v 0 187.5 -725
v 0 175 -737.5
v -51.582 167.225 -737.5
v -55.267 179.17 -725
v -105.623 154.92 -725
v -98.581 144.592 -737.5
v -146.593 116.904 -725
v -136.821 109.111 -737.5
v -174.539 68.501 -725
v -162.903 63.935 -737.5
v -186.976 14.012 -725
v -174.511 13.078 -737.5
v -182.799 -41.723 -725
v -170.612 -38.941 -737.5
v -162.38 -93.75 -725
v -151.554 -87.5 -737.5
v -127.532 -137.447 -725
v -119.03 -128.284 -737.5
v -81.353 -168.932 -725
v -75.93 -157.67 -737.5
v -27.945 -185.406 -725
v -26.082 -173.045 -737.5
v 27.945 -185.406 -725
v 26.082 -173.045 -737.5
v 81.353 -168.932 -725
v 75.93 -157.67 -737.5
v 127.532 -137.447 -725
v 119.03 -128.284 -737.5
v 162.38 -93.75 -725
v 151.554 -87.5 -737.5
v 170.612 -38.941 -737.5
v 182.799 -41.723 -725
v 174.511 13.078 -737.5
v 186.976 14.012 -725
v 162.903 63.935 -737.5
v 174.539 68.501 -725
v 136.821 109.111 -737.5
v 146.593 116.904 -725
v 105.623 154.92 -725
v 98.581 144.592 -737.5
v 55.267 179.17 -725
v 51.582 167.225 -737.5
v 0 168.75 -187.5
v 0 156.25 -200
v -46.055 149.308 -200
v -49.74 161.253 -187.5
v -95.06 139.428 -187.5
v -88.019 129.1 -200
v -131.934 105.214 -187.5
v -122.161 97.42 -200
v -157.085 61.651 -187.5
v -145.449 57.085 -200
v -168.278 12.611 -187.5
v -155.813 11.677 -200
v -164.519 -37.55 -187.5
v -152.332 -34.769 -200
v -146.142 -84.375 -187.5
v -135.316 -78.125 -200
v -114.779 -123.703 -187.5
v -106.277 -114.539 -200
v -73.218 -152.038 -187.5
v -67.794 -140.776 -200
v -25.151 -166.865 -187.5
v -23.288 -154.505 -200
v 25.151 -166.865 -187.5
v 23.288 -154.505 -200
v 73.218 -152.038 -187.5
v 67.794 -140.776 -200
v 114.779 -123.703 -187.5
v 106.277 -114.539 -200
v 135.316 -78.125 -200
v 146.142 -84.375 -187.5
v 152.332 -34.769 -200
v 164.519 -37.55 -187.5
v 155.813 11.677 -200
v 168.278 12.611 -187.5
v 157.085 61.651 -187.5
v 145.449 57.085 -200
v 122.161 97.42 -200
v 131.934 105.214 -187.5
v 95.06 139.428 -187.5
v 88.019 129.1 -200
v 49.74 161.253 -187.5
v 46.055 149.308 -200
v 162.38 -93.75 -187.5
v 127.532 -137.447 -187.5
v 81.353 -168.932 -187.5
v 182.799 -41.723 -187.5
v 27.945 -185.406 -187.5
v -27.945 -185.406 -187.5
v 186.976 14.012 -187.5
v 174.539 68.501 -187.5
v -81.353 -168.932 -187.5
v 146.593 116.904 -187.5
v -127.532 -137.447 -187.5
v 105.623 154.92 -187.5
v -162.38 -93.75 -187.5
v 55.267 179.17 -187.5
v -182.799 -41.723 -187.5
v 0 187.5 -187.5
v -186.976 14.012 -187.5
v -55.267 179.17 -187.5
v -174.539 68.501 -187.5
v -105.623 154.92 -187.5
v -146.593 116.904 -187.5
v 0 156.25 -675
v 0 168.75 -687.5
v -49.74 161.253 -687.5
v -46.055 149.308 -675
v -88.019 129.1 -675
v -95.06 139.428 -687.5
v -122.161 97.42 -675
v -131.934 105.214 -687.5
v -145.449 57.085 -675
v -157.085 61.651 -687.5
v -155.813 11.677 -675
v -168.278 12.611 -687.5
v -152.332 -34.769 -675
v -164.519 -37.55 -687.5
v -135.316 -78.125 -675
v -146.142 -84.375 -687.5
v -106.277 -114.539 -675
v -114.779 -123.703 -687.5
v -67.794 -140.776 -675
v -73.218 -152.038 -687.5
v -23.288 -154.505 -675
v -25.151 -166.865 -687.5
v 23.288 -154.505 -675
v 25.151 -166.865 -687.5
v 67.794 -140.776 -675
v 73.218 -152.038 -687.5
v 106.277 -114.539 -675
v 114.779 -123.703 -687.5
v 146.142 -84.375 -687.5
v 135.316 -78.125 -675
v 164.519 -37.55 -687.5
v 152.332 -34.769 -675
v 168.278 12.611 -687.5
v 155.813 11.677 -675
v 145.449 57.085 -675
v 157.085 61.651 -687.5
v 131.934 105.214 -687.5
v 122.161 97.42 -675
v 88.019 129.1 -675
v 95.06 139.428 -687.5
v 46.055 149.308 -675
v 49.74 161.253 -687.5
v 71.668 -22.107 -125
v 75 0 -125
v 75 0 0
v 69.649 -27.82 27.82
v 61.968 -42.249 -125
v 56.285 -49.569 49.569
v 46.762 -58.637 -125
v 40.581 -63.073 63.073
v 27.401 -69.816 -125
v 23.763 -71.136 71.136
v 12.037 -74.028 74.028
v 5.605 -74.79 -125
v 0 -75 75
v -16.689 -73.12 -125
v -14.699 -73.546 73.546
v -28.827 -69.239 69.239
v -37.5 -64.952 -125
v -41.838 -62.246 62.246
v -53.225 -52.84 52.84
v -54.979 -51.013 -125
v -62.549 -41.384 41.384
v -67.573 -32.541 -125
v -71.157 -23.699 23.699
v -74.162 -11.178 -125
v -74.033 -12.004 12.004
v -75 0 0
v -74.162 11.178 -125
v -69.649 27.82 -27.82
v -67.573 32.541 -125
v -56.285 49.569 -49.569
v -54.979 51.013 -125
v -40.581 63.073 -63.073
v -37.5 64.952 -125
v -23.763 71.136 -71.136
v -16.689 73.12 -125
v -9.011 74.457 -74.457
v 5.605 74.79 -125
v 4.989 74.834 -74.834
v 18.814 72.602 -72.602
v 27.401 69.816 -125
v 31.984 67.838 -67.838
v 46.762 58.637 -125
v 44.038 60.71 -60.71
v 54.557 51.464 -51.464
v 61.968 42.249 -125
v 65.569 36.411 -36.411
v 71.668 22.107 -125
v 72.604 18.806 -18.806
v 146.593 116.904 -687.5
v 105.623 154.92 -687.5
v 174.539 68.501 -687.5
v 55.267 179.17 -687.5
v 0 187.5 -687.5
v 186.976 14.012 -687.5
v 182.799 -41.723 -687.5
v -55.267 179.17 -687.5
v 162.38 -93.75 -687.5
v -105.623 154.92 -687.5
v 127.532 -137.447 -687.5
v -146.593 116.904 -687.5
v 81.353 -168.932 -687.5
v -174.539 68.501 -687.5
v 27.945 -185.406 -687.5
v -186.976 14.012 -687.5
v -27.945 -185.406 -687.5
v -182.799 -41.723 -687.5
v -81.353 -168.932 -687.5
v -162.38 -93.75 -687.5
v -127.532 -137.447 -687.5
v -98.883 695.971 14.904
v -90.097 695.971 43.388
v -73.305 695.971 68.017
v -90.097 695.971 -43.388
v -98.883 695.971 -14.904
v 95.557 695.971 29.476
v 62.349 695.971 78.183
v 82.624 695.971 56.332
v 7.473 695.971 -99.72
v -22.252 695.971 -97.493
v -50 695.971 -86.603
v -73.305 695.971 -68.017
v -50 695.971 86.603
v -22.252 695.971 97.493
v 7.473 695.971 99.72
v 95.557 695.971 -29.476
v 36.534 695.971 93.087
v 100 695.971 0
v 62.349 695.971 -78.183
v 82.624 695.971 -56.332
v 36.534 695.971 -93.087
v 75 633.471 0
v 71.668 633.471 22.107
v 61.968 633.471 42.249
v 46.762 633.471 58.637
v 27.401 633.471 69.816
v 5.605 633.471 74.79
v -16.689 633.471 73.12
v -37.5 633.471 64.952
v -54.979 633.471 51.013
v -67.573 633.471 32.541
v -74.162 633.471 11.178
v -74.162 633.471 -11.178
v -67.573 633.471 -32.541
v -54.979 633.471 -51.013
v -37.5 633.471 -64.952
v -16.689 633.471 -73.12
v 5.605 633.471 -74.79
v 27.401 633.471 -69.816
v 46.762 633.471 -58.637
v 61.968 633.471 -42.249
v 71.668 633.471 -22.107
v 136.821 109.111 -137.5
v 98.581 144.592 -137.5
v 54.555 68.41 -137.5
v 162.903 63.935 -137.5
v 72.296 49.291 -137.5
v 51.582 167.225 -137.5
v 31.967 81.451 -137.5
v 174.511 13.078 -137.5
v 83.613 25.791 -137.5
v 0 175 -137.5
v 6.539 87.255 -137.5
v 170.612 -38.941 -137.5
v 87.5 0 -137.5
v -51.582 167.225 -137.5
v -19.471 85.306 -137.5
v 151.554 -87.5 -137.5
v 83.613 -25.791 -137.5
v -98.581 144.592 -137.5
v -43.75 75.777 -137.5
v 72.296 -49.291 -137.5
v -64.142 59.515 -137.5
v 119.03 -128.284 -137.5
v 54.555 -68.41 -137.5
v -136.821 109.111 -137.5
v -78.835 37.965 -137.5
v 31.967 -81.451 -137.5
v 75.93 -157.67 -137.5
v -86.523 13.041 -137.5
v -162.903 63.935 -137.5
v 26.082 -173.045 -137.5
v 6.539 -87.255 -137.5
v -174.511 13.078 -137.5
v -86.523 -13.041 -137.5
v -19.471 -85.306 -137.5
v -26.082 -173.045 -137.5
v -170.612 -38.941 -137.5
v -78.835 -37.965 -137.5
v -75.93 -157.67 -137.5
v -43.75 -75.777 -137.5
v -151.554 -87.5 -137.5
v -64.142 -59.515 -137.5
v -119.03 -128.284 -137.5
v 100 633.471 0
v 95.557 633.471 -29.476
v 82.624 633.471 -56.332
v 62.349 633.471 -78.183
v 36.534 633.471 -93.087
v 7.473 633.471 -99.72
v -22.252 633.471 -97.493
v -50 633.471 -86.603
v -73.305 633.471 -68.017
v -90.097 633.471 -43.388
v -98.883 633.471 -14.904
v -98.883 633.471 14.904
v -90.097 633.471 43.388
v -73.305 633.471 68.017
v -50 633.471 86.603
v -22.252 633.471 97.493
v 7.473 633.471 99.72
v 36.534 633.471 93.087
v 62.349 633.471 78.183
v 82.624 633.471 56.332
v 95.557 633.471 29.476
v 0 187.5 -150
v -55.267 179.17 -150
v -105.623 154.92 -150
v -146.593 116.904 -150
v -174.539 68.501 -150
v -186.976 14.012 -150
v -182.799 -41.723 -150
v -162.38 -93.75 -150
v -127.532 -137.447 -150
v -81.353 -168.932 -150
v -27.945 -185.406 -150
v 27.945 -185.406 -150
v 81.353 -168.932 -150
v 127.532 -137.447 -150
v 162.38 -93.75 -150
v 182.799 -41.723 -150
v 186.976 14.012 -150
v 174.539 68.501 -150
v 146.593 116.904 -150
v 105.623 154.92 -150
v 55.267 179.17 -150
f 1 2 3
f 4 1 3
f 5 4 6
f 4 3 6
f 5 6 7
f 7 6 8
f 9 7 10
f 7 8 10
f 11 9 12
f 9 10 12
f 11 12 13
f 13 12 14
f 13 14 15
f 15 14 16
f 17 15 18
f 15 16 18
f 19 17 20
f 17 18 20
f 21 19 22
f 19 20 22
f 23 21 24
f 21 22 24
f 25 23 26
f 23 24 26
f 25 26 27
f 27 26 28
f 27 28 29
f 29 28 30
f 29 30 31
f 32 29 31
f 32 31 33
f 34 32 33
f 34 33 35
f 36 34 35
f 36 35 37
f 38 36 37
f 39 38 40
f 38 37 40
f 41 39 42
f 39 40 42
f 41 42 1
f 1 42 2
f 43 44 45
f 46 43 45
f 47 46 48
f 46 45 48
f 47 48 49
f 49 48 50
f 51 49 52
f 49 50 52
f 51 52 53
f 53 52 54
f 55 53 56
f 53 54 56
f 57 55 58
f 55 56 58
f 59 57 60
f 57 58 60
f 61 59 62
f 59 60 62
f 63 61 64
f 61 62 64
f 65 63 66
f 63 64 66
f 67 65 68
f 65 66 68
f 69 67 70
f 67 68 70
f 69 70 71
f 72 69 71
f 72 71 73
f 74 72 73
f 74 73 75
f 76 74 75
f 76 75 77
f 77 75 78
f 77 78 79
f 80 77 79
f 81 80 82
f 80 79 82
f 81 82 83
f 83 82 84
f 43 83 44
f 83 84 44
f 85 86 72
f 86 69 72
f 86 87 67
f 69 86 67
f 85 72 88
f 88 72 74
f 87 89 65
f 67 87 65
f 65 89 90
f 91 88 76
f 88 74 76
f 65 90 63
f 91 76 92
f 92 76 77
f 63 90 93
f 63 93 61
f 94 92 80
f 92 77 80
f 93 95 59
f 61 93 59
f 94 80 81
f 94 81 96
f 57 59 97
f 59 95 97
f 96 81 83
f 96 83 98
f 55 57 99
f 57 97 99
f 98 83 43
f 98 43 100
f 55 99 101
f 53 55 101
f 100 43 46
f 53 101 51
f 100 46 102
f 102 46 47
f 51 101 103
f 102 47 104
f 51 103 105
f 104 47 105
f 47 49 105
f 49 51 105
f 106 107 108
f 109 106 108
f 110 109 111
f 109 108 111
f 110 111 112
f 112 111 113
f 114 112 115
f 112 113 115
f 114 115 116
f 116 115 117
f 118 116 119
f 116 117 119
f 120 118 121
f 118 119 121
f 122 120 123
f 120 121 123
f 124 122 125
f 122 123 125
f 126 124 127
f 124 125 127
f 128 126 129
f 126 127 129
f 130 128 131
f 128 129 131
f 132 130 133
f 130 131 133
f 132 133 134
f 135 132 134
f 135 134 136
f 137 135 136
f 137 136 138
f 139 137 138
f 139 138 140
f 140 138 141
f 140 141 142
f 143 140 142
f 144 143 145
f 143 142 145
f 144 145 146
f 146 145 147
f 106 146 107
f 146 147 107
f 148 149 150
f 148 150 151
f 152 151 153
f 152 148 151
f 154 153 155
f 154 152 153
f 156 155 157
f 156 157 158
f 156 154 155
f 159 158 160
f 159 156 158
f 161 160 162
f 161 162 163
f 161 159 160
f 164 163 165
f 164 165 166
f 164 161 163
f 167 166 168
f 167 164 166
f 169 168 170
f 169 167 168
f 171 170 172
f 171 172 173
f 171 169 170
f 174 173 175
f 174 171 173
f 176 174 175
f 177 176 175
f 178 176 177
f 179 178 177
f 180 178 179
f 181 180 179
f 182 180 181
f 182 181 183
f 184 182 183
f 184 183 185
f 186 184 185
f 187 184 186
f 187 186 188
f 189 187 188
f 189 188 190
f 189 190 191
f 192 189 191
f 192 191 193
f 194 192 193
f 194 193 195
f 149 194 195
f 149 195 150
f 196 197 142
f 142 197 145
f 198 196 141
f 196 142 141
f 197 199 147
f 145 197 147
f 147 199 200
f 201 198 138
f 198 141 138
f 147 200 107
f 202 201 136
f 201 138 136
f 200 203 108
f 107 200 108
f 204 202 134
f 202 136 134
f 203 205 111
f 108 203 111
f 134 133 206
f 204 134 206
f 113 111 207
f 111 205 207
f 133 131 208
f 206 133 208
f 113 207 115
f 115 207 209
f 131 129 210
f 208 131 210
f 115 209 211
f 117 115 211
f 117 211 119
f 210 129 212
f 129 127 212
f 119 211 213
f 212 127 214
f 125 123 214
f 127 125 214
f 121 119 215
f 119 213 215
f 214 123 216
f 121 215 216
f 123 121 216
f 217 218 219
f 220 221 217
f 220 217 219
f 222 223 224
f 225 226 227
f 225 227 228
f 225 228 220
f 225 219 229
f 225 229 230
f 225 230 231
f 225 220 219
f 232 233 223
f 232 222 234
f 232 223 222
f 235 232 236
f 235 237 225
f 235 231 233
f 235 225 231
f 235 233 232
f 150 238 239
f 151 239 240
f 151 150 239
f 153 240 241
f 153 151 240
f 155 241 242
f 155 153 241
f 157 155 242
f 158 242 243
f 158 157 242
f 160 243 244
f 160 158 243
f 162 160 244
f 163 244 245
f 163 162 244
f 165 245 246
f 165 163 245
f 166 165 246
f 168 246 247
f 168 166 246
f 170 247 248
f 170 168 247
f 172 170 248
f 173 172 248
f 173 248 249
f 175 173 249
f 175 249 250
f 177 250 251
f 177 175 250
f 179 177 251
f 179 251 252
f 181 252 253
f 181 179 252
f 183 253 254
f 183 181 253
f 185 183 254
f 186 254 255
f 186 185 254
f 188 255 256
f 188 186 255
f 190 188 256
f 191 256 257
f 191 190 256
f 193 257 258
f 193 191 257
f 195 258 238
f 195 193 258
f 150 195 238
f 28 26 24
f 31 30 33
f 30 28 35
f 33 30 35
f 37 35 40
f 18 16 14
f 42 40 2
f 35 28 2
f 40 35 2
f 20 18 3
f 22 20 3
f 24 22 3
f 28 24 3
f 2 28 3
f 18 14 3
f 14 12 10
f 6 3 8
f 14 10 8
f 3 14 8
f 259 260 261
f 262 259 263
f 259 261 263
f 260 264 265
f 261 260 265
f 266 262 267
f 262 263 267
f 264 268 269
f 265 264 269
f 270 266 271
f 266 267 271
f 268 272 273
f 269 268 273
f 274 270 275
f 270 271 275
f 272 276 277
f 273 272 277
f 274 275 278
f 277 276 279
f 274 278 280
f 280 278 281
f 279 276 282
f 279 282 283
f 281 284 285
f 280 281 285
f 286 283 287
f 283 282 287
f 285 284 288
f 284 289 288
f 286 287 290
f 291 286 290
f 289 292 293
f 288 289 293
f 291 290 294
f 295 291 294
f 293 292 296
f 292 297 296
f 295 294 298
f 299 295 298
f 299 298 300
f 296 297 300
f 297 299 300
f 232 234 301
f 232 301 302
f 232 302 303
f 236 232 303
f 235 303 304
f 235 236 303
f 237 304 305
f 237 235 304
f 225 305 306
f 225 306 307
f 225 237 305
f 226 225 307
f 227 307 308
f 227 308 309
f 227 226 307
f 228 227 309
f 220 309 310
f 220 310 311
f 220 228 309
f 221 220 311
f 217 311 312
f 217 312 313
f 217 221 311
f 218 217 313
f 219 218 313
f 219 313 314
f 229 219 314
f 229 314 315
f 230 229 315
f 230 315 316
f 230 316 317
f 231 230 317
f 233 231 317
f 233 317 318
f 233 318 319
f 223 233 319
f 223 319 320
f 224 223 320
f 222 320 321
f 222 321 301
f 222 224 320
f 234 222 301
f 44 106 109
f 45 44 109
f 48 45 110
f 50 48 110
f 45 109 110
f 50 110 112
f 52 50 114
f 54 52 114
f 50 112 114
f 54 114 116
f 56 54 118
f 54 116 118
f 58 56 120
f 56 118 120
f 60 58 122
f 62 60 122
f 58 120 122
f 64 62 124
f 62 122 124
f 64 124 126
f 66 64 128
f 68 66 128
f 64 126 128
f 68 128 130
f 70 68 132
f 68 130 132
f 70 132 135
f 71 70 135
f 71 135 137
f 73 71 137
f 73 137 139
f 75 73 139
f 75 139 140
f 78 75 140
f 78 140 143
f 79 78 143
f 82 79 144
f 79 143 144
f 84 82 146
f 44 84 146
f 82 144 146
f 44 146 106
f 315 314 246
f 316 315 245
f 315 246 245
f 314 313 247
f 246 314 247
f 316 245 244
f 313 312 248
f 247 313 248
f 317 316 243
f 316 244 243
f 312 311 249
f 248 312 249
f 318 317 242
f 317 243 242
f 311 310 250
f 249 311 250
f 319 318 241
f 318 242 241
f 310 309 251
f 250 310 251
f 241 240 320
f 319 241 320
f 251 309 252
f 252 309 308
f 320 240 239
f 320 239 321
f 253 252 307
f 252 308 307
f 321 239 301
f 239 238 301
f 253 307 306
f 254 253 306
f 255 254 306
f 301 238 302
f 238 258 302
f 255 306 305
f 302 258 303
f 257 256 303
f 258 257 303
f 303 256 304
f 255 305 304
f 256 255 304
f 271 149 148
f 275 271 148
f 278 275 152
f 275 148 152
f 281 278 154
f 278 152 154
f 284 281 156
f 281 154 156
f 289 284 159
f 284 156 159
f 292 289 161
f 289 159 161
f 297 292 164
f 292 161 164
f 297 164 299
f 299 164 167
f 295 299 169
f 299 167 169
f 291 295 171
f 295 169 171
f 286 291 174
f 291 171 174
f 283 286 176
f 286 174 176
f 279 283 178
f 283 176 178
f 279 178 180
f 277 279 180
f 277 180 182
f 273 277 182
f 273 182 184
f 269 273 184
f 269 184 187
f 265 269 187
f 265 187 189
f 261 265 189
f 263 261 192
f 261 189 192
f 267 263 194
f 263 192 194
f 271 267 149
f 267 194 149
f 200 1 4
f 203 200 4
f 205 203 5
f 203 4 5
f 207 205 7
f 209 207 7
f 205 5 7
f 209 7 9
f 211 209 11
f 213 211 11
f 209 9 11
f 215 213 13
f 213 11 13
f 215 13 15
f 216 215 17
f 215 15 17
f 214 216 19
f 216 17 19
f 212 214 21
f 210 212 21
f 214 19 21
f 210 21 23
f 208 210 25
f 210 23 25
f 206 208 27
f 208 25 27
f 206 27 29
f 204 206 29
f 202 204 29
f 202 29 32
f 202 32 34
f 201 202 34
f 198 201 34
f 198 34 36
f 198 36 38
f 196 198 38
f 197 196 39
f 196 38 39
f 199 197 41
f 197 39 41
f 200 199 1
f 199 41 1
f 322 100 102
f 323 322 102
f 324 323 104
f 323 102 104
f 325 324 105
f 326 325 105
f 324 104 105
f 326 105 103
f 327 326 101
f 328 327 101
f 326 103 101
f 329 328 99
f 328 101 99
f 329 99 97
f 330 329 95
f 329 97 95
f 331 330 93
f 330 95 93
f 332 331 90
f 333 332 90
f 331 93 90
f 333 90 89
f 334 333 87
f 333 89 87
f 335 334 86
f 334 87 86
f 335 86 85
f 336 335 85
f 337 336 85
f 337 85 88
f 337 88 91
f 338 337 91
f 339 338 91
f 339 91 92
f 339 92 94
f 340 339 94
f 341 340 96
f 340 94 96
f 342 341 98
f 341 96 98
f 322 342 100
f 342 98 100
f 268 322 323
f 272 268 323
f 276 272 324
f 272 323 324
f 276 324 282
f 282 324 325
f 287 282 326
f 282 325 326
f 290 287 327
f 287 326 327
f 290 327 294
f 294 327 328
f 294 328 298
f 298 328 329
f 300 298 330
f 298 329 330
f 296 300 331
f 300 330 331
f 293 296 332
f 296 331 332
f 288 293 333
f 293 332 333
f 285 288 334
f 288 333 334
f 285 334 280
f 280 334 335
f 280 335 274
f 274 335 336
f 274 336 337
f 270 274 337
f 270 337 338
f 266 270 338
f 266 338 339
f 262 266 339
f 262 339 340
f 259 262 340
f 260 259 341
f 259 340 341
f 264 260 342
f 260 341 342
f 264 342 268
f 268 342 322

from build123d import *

# Parameters (mm, degrees)
SKETCH2_R           = 75
SKETCH3_R           = 100
BOSS_EXTRUDE1_DEPTH = 62.5
CHAMFER1_SIZE       = 12.5


with BuildPart() as part:
    # Sweep1: sweep along a path in Sketch1
    with BuildLine(Plane(origin=(0, 0, 0), x_dir=(0, 0, -1), z_dir=(1, 0, 0))) as sweep1_path:
        Line((0, 695.970875), (0, 0))
        Line((0, 0), (737.5, 0))
    # Sketch2 → Sweep1 (sweep)
    with BuildSketch(Plane(origin=(0, 695.970875, 0), x_dir=(1, 0, 0), z_dir=(0, 1, 0))):
        Circle(SKETCH2_R)
    sweep(path=sweep1_path.line, transition=Transition.RIGHT)

    # Sketch3 → Boss-Extrude1 (add)
    with BuildSketch(Plane(origin=(0, 695.970875, 0), x_dir=(1, 0, 0), z_dir=(0, 1, 0))):
        Circle(SKETCH3_R)
    extrude(amount=-BOSS_EXTRUDE1_DEPTH)

    # Sketch4 → Revolve1 (revolve)
    with BuildSketch(Plane(origin=(0, 0, 0), x_dir=(0, 0, -1), z_dir=(1, 0, 0))):
        Polygon((137.5, 75), (137.5, 187.5), (187.5, 187.5), (187.5, 156.25), (687.5, 156.25), (687.5, 187.5), (737.5, 187.5), (737.5, 75), align=None)
    revolve(axis=Axis((0, 0, -737.5), (0, 0, 1)))

    # Chamfer1
    chamfer1_edges = [part.edges().sort_by_distance(p)[0] for p in [
        (-75, 0, -137.5),
        (0, -187.5, -137.5),
        (0, -156.25, -187.5),
        (0, -156.25, -687.5),
        (0, -187.5, -737.5),
    ]]
    chamfer(chamfer1_edges, length=CHAMFER1_SIZE)


solid = part.part
